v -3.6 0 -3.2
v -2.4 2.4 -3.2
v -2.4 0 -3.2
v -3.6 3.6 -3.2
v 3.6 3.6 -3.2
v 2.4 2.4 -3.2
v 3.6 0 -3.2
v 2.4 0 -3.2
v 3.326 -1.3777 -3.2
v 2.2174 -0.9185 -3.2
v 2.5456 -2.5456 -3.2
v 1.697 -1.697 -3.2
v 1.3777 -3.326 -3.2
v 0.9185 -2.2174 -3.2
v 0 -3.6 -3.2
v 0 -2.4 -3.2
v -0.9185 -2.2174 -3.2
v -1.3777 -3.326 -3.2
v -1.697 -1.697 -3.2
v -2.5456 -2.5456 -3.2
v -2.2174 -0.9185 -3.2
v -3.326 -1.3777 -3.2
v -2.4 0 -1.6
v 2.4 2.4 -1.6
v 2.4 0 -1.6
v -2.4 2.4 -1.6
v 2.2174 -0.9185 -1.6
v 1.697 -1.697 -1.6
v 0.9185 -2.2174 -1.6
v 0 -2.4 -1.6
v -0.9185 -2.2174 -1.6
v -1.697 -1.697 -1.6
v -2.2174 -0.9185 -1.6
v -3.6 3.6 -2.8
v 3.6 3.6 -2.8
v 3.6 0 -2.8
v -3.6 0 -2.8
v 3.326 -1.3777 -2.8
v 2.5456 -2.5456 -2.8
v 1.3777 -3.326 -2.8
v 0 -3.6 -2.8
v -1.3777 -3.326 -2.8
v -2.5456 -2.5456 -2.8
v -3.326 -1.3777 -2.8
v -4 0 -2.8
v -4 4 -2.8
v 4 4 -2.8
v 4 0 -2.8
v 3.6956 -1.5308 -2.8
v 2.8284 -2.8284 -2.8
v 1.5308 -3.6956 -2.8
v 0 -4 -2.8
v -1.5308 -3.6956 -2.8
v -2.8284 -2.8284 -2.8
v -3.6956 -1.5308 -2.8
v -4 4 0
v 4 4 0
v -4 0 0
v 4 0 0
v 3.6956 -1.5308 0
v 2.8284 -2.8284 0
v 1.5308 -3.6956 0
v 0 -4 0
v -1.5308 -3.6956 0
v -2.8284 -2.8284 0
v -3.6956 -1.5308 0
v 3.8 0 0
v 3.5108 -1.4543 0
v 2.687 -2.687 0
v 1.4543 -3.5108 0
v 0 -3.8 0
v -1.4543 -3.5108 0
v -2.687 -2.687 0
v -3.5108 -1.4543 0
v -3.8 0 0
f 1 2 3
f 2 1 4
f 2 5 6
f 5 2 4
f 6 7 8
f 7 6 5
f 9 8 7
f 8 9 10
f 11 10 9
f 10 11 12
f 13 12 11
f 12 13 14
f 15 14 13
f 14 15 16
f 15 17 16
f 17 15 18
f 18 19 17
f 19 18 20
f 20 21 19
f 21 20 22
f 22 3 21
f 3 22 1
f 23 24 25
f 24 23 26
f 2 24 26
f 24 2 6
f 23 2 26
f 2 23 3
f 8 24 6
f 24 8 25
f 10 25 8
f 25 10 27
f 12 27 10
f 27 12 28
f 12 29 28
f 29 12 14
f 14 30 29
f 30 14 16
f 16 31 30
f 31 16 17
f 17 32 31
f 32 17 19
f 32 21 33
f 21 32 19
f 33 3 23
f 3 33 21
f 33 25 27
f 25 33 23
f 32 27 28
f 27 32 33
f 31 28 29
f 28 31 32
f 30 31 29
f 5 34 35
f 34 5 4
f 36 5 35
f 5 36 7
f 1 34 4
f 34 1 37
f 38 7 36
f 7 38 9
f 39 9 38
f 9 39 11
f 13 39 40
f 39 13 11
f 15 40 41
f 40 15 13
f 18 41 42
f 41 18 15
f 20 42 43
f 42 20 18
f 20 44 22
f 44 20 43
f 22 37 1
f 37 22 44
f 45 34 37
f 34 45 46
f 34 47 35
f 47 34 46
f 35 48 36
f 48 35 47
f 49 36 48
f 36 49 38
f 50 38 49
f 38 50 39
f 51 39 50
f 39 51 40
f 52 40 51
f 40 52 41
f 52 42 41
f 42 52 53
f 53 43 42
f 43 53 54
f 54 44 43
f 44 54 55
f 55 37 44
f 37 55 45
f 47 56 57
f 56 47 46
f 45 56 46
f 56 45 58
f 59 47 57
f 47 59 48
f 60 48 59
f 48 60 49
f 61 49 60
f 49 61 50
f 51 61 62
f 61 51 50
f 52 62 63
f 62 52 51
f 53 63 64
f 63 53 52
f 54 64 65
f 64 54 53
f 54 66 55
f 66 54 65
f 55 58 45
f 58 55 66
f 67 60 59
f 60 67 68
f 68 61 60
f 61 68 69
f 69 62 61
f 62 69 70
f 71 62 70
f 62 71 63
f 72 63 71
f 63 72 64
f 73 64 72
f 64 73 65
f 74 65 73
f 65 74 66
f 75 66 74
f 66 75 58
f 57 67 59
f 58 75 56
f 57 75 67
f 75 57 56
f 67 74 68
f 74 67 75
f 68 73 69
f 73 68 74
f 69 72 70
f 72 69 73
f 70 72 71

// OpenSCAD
// file: ../p/2-4edge.scad
use <../lib.scad>
function ldraw_lib__2_4edge() = [
// 0 Circle 0.5
// 0 Name: 2-4edge.dat
// 0 Author: James Jessiman
// 0 !LDRAW_ORG Primitive UPDATE 2017-01
// 0 !LICENSE Licensed under CC BY 4.0 : see CAreadme.txt
// 
// 0 BFC CERTIFY CCW
  [0,"BFC","CERTIFY"],
  [0,"BFC","CCW"],
// 
// 0 !HISTORY 2007-06-24 [PTadmin] Header formatted for Contributor Agreement
// 0 !HISTORY 2008-07-01 [PTadmin] Official Update 2008-01
// 0 !HISTORY 2017-01-15 [Steffen] BFCed
// 0 !HISTORY 2017-12-30 [PTadmin] Official Update 2017-01
// 
// 
// 2 24 1 0 0 0.9239 0 0.3827
  [2,24,1,0,0,0.9239,0,0.3827],
// 2 24 0.9239 0 0.3827 0.7071 0 0.7071
  [2,24,0.9239,0,0.3827,0.7071,0,0.7071],
// 2 24 0.7071 0 0.7071 0.3827 0 0.9239
  [2,24,0.7071,0,0.7071,0.3827,0,0.9239],
// 2 24 0.3827 0 0.9239 0 0 1
  [2,24,0.3827,0,0.9239,0,0,1],
// 2 24 0 0 1 -0.3827 0 0.9239
  [2,24,0,0,1,-0.3827,0,0.9239],
// 2 24 -0.3827 0 0.9239 -0.7071 0 0.7071
  [2,24,-0.3827,0,0.9239,-0.7071,0,0.7071],
// 2 24 -0.7071 0 0.7071 -0.9239 0 0.3827
  [2,24,-0.7071,0,0.7071,-0.9239,0,0.3827],
// 2 24 -0.9239 0 0.3827 -1 0 0
  [2,24,-0.9239,0,0.3827,-1,0,0],
];
module ldraw_lib__2_4edge(step=0, col=false, unit=2/5, alt=false, line=0.2, solid=!$preview)
    makepoly(ldraw_lib__2_4edge(), step=step, col=col, unit=unit, alt=alt, line=line, solid=solid);
ldraw_lib__2_4edge(line=0.2);
// file: ../p/2-4cyli.scad
use <../lib.scad>
function ldraw_lib__2_4cyli() = [
// 0 Cylinder 0.5
// 0 Name: 2-4cyli.dat
// 0 Author: James Jessiman
// 0 !LDRAW_ORG Primitive UPDATE 2005-01
// 0 !LICENSE Licensed under CC BY 4.0 : see CAreadme.txt
// 
// 0 BFC CERTIFY CCW
  [0,"BFC","CERTIFY"],
  [0,"BFC","CCW"],
// 
// 0 !HISTORY 2002-03-23 [sbliss] Added BFC statement; compacted code
// 0 !HISTORY 2002-04-25 [PTadmin] Official Update 2002-02
// 0 !HISTORY 2004-12-11 [nielsk] Recreated using Primitive Generator, Edge lines fixed, BFC changed to CCW
// 0 !HISTORY 2005-12-28 [PTadmin] Official Update 2005-01
// 0 !HISTORY 2007-06-24 [PTadmin] Header formatted for Contributor Agreement
// 0 !HISTORY 2008-07-01 [PTadmin] Official Update 2008-01
// 
// 
// 4 16 .9239 1 .3827 .9239 0 .3827 1 0 0 1 1 0
  [4,16,.9239,1,.3827,.9239,0,.3827,1,0,0,1,1,0],
// 4 16 .7071 1 .7071 .7071 0 .7071 .9239 0 .3827 .9239 1 .3827
  [4,16,.7071,1,.7071,.7071,0,.7071,.9239,0,.3827,.9239,1,.3827],
// 4 16 .3827 1 .9239 .3827 0 .9239 .7071 0 .7071 .7071 1 .7071
  [4,16,.3827,1,.9239,.3827,0,.9239,.7071,0,.7071,.7071,1,.7071],
// 4 16 0 1 1 0 0 1 .3827 0 .9239 .3827 1 .9239
  [4,16,0,1,1,0,0,1,.3827,0,.9239,.3827,1,.9239],
// 4 16 -.3827 1 .9239 -.3827 0 .9239 0 0 1 0 1 1
  [4,16,-.3827,1,.9239,-.3827,0,.9239,0,0,1,0,1,1],
// 4 16 -.7071 1 .7071 -.7071 0 .7071 -.3827 0 .9239 -.3827 1 .9239
  [4,16,-.7071,1,.7071,-.7071,0,.7071,-.3827,0,.9239,-.3827,1,.9239],
// 4 16 -.9239 1 .3827 -.9239 0 .3827 -.7071 0 .7071 -.7071 1 .7071
  [4,16,-.9239,1,.3827,-.9239,0,.3827,-.7071,0,.7071,-.7071,1,.7071],
// 4 16 -1 1 0 -1 0 0 -.9239 0 .3827 -.9239 1 .3827
  [4,16,-1,1,0,-1,0,0,-.9239,0,.3827,-.9239,1,.3827],
// 5 24 1 1 0 1 0 0 1 1 -.4142 .9239 1 .3827
  [5,24,1,1,0,1,0,0,1,1,-.4142,.9239,1,.3827],
// 5 24 .9239 1 .3827 .9239 0 .3827 1 1 0 .7071 1 .7071
  [5,24,.9239,1,.3827,.9239,0,.3827,1,1,0,.7071,1,.7071],
// 5 24 .7071 1 .7071 .7071 0 .7071 .9239 1 .3827 .3827 1 .9239
  [5,24,.7071,1,.7071,.7071,0,.7071,.9239,1,.3827,.3827,1,.9239],
// 5 24 .3827 1 .9239 .3827 0 .9239 .7071 1 .7071 0 1 1
  [5,24,.3827,1,.9239,.3827,0,.9239,.7071,1,.7071,0,1,1],
// 5 24 0 1 1 0 0 1 .3827 1 .9239 -.3827 1 .9239
  [5,24,0,1,1,0,0,1,.3827,1,.9239,-.3827,1,.9239],
// 5 24 -.3827 1 .9239 -.3827 0 .9239 0 1 1 -.7071 1 .7071
  [5,24,-.3827,1,.9239,-.3827,0,.9239,0,1,1,-.7071,1,.7071],
// 5 24 -.7071 1 .7071 -.7071 0 .7071 -.3827 1 .9239 -.9239 1 .3827
  [5,24,-.7071,1,.7071,-.7071,0,.7071,-.3827,1,.9239,-.9239,1,.3827],
// 5 24 -.9239 1 .3827 -.9239 0 .3827 -.7071 1 .7071 -1 1 0
  [5,24,-.9239,1,.3827,-.9239,0,.3827,-.7071,1,.7071,-1,1,0],
// 5 24 -1 1 0 -1 0 0 -.9239 1 .3827 -1 1 -.4142
  [5,24,-1,1,0,-1,0,0,-.9239,1,.3827,-1,1,-.4142],
// 0
];
module ldraw_lib__2_4cyli(step=0, col=false, unit=2/5, alt=false, line=0.2, solid=!$preview)
    makepoly(ldraw_lib__2_4cyli(), step=step, col=col, unit=unit, alt=alt, line=line, solid=solid);
ldraw_lib__2_4cyli(line=0.2);
// file: ../p/box4-4a.scad
use <../lib.scad>
function ldraw_lib__box4_4a() = [
// 0 Box with  4 Faces without  4 Adjacent Edges
// 0 Name: box4-4a.dat
// 0 Author: Willy Tschager [Holly-Wood]
// 0 !LDRAW_ORG Primitive UPDATE 2024-01
// 0 !LICENSE Licensed under CC BY 4.0 : see CAreadme.txt
// 
// 0 BFC CERTIFY CCW
  [0,"BFC","CERTIFY"],
  [0,"BFC","CCW"],
// 
// 0 !HISTORY 1998-07-15 [PTadmin] Official Update 1998-07
// 0 !HISTORY 2002-12-13 [hafhead] Made BFC compliant
// 0 !HISTORY 2003-03-12 [PTadmin] Official Update 2003-01
// 0 !HISTORY 2007-06-24 [PTadmin] Header formatted for Contributor Agreement
// 0 !HISTORY 2008-07-01 [PTadmin] Official Update 2008-01
// 0 !HISTORY 2012-02-16 [Philo] Changed to CCW
// 0 !HISTORY 2012-03-30 [PTadmin] Official Update 2012-01
// 0 !HISTORY 2024-01-03 [Holly-Wood] Complete re-write, original by Manfred Moolhuysen
// 0 !HISTORY 2024-01-29 [OrionP] Official Update 2024-01
// 
// 2 24 -1 1 -1 -1 1 1
  [2,24,-1,1,-1,-1,1,1],
// 2 24 1 1 1 1 1 -1
  [2,24,1,1,1,1,1,-1],
// 2 24 -1 1 1 1 1 1
  [2,24,-1,1,1,1,1,1],
// 4 16 1 1 1 1 1 -1 -1 1 -1 -1 1 1
  [4,16,1,1,1,1,1,-1,-1,1,-1,-1,1,1],
// 
// 2 24 -1 0 -1 -1 0 1
  [2,24,-1,0,-1,-1,0,1],
// 4 16 -1 1 1 -1 1 -1 -1 0 -1 -1 0 1
  [4,16,-1,1,1,-1,1,-1,-1,0,-1,-1,0,1],
// 
// 2 24 1 0 1 1 0 -1
  [2,24,1,0,1,1,0,-1],
// 4 16 1 1 -1 1 1 1 1 0 1 1 0 -1
  [4,16,1,1,-1,1,1,1,1,0,1,1,0,-1],
// 
// 2 24 1 1 1 1 0 1
  [2,24,1,1,1,1,0,1],
// 2 24 -1 1 1 -1 0 1
  [2,24,-1,1,1,-1,0,1],
// 2 24 -1 0 1 1 0 1
  [2,24,-1,0,1,1,0,1],
// 4 16 1 1 1 -1 1 1 -1 0 1 1 0 1
  [4,16,1,1,1,-1,1,1,-1,0,1,1,0,1],
];
module ldraw_lib__box4_4a(step=0, col=false, unit=2/5, alt=false, line=0.2, solid=!$preview)
    makepoly(ldraw_lib__box4_4a(), step=step, col=col, unit=unit, alt=alt, line=line, solid=solid);
ldraw_lib__box4_4a(line=0.2);
// file: ../p/box3u4a.scad
use <../lib.scad>
function ldraw_lib__box3u4a() = [
// 0 Box with 3 Faces without 4 Adjacent Edges
// 0 Name: box3u4a.dat
// 0 Author: Niels Karsdorp [nielsk]
// 0 !LDRAW_ORG Primitive UPDATE 2009-01
// 0 !LICENSE Licensed under CC BY 4.0 : see CAreadme.txt
// 
// 0 BFC CERTIFY CCW
  [0,"BFC","CERTIFY"],
  [0,"BFC","CCW"],
// 
// 0 !HISTORY 2009-05-02 [PTadmin] Official Update 2009-01
// 
// 
// 2 24 1 1 1 -1 1 1
  [2,24,1,1,1,-1,1,1],
// 2 24 -1 1 -1 1 1 -1
  [2,24,-1,1,-1,1,1,-1],
// 2 24 1 1 1 1 1 -1
  [2,24,1,1,1,1,1,-1],
// 2 24 -1 1 1 -1 1 -1
  [2,24,-1,1,1,-1,1,-1],
// 2 24 1 1 1 1 0 1
  [2,24,1,1,1,1,0,1],
// 2 24 1 1 -1 1 0 -1
  [2,24,1,1,-1,1,0,-1],
// 2 24 -1 1 1 -1 0 1
  [2,24,-1,1,1,-1,0,1],
// 2 24 -1 1 -1 -1 0 -1
  [2,24,-1,1,-1,-1,0,-1],
// 4 16 -1 1 -1 -1 1 1 1 1 1 1 1 -1
  [4,16,-1,1,-1,-1,1,1,1,1,1,1,1,-1],
// 4 16 -1 1 1 -1 0 1 1 0 1 1 1 1
  [4,16,-1,1,1,-1,0,1,1,0,1,1,1,1],
// 4 16 1 1 -1 1 0 -1 -1 0 -1 -1 1 -1
  [4,16,1,1,-1,1,0,-1,-1,0,-1,-1,1,-1],
// 0
];
module ldraw_lib__box3u4a(step=0, col=false, unit=2/5, alt=false, line=0.2, solid=!$preview)
    makepoly(ldraw_lib__box3u4a(), step=step, col=col, unit=unit, alt=alt, line=line, solid=solid);
ldraw_lib__box3u4a(line=0.2);
// file: ../p/2-4ring9.scad
use <../lib.scad>
function ldraw_lib__2_4ring9() = [
// 0 Ring  9 x 0.5
// 0 Name: 2-4ring9.dat
// 0 Author: Willy Tschager [Holly-Wood]
// 0 !LDRAW_ORG Primitive UPDATE 2024-01
// 0 !LICENSE Licensed under CC BY 4.0 : see CAreadme.txt
// 
// 0 BFC CERTIFY CCW
  [0,"BFC","CERTIFY"],
  [0,"BFC","CCW"],
// 
// 0 !HISTORY 2009-09-03 [PTadmin] Official Update 2009-02
// 0 !HISTORY 2024-01-10 [Holly-Wood] Complete regeneration, original by guyvivan
// 0 !HISTORY 2024-01-29 [OrionP] Official Update 2024-01
// 
// 4 16 10 0 0 9.239 0 3.827 8.3151 0 3.4443 9 0 0
  [4,16,10,0,0,9.239,0,3.827,8.3151,0,3.4443,9,0,0],
// 4 16 9.239 0 3.827 7.071 0 7.071 6.3639 0 6.3639 8.3151 0 3.4443
  [4,16,9.239,0,3.827,7.071,0,7.071,6.3639,0,6.3639,8.3151,0,3.4443],
// 4 16 7.071 0 7.071 3.827 0 9.239 3.4443 0 8.3151 6.3639 0 6.3639
  [4,16,7.071,0,7.071,3.827,0,9.239,3.4443,0,8.3151,6.3639,0,6.3639],
// 4 16 3.827 0 9.239 0 0 10 0 0 9 3.4443 0 8.3151
  [4,16,3.827,0,9.239,0,0,10,0,0,9,3.4443,0,8.3151],
// 4 16 0 0 10 -3.827 0 9.239 -3.4443 0 8.3151 0 0 9
  [4,16,0,0,10,-3.827,0,9.239,-3.4443,0,8.3151,0,0,9],
// 4 16 -3.827 0 9.239 -7.071 0 7.071 -6.3639 0 6.3639 -3.4443 0 8.3151
  [4,16,-3.827,0,9.239,-7.071,0,7.071,-6.3639,0,6.3639,-3.4443,0,8.3151],
// 4 16 -7.071 0 7.071 -9.239 0 3.827 -8.3151 0 3.4443 -6.3639 0 6.3639
  [4,16,-7.071,0,7.071,-9.239,0,3.827,-8.3151,0,3.4443,-6.3639,0,6.3639],
// 4 16 -9.239 0 3.827 -10 0 0 -9 0 0 -8.3151 0 3.4443
  [4,16,-9.239,0,3.827,-10,0,0,-9,0,0,-8.3151,0,3.4443],
// 0 // Build by LDPartEditor (PrimGen 2.X)
];
module ldraw_lib__2_4ring9(step=0, col=false, unit=2/5, alt=false, line=0.2, solid=!$preview)
    makepoly(ldraw_lib__2_4ring9(), step=step, col=col, unit=unit, alt=alt, line=line, solid=solid);
ldraw_lib__2_4ring9(line=0.2);
// file: ../p/2-4ring2.scad
use <../lib.scad>
function ldraw_lib__2_4ring2() = [
// 0 Ring  2 x 0.5
// 0 Name: 2-4ring2.dat
// 0 Author: Chris Dee [cwdee]
// 0 !LDRAW_ORG Primitive UPDATE 2012-01
// 0 !LICENSE Licensed under CC BY 4.0 : see CAreadme.txt
// 
// 0 BFC CERTIFY CCW
  [0,"BFC","CERTIFY"],
  [0,"BFC","CCW"],
// 
// 0 !HISTORY 2001-10-26 [PTadmin] Official Update 2001-01
// 0 !HISTORY 2007-06-24 [PTadmin] Header formatted for Contributor Agreement
// 0 !HISTORY 2008-07-01 [PTadmin] Official Update 2008-01
// 0 !HISTORY 2012-02-16 [Philo] Changed to CCW
// 0 !HISTORY 2012-03-30 [PTadmin] Official Update 2012-01
// 
// 
// 4 16 3 0 0 2.7717 0 1.1481 1.8478 0 0.7654 2 0 0
  [4,16,3,0,0,2.7717,0,1.1481,1.8478,0,0.7654,2,0,0],
// 4 16 2.7717 0 1.1481 2.1213 0 2.1213 1.4142 0 1.4142 1.8478 0 0.7654
  [4,16,2.7717,0,1.1481,2.1213,0,2.1213,1.4142,0,1.4142,1.8478,0,0.7654],
// 4 16 2.1213 0 2.1213 1.1481 0 2.7717 0.7654 0 1.8478 1.4142 0 1.4142
  [4,16,2.1213,0,2.1213,1.1481,0,2.7717,0.7654,0,1.8478,1.4142,0,1.4142],
// 4 16 1.1481 0 2.7717 0 0 3 0 0 2 0.7654 0 1.8478
  [4,16,1.1481,0,2.7717,0,0,3,0,0,2,0.7654,0,1.8478],
// 4 16 0 0 3 -1.1481 0 2.7717 -0.7654 0 1.8478 0 0 2
  [4,16,0,0,3,-1.1481,0,2.7717,-0.7654,0,1.8478,0,0,2],
// 4 16 -1.1481 0 2.7717 -2.1213 0 2.1213 -1.4142 0 1.4142 -0.7654 0 1.8478
  [4,16,-1.1481,0,2.7717,-2.1213,0,2.1213,-1.4142,0,1.4142,-0.7654,0,1.8478],
// 4 16 -2.1213 0 2.1213 -2.7717 0 1.1481 -1.8478 0 0.7654 -1.4142 0 1.4142
  [4,16,-2.1213,0,2.1213,-2.7717,0,1.1481,-1.8478,0,0.7654,-1.4142,0,1.4142],
// 4 16 -2.7717 0 1.1481 -3 0 0 -2 0 0 -1.8478 0 0.7654
  [4,16,-2.7717,0,1.1481,-3,0,0,-2,0,0,-1.8478,0,0.7654],
];
module ldraw_lib__2_4ring2(step=0, col=false, unit=2/5, alt=false, line=0.2, solid=!$preview)
    makepoly(ldraw_lib__2_4ring2(), step=step, col=col, unit=unit, alt=alt, line=line, solid=solid);
ldraw_lib__2_4ring2(line=0.2);
// file: ../p/2-4cylo.scad
use <../lib.scad>
use <2-4cyli.scad>
use <2-4edge.scad>
function ldraw_lib__2_4cylo() = [
// 0 Cylinder Open 0.5
// 0 Name: 2-4cylo.dat
// 0 Author: Max Martin Richter [MMR1988]
// 0 !LDRAW_ORG Primitive UPDATE 2010-03
// 0 !LICENSE Licensed under CC BY 4.0 : see CAreadme.txt
// 
// 0 BFC CERTIFY CCW
  [0,"BFC","CERTIFY"],
  [0,"BFC","CCW"],
// 
// 0 !HISTORY 2010-12-31 [PTadmin] Official Update 2010-03
// 
// 
// 1 16 0 0 0 1 0 0 0 1 0 0 0 1 2-4edge.dat
  [1,16,0,0,0,1,0,0,0,1,0,0,0,1, ldraw_lib__2_4edge()],
// 1 16 0 1 0 1 0 0 0 1 0 0 0 1 2-4edge.dat
  [1,16,0,1,0,1,0,0,0,1,0,0,0,1, ldraw_lib__2_4edge()],
// 1 16 0 0 0 1 0 0 0 1 0 0 0 1 2-4cyli.dat
  [1,16,0,0,0,1,0,0,0,1,0,0,0,1, ldraw_lib__2_4cyli()],
];
module ldraw_lib__2_4cylo(step=0, col=false, unit=2/5, alt=false, line=0.2, solid=!$preview)
    makepoly(ldraw_lib__2_4cylo(), step=step, col=col, unit=unit, alt=alt, line=line, solid=solid);
ldraw_lib__2_4cylo(line=0.2);
// file: s/24246s02.scad
use <../../lib.scad>
use <../../p/2-4chrd.scad>
use <../../p/2-4cylo.scad>
use <../../p/2-4ring2.scad>
use <../../p/2-4ring9.scad>
use <../../p/box3u4a.scad>
use <../../p/box4-4a.scad>
function ldraw_lib__s__24246s02() = [
// 0 ~Tile  1 x  1 with Rounded End without Complete Top Face
// 0 Name: s\24246s02.dat
// 0 Author: Magnus Forsberg [MagFors]
// 0 !LDRAW_ORG Subpart UPDATE 2020-02
// 0 !LICENSE Licensed under CC BY 4.0 : see CAreadme.txt
// 
// 0 BFC CERTIFY CCW
  [0,"BFC","CERTIFY"],
  [0,"BFC","CCW"],
// 
// 0 !HISTORY 2020-09-05 [PTadmin] Official Update 2020-02
// 
// 
// 4 16 -9 8 0 -9 8 9 -6 8 6 -6 8 0
  [4,16,-9,8,0,-9,8,9,-6,8,6,-6,8,0],
// 4 16 -9 8 9 9 8 9 6 8 6 -6 8 6
  [4,16,-9,8,9,9,8,9,6,8,6,-6,8,6],
// 4 16 9 8 9 9 8 0 6 8 0 6 8 6
  [4,16,9,8,9,9,8,0,6,8,0,6,8,6],
// 1 16 0 8 0 3 0 0 0 -1 0 0 0 -3 2-4ring2.dat
  [1,16,0,8,0,3,0,0,0,-1,0,0,0,-3, ldraw_lib__2_4ring2()],
// 0 BFC INVERTNEXT
  [0,"BFC","INVERTNEXT"],
// 1 16 0 8 3 6 0 0 0 -4 0 0 0 3 box4-4a.dat
  [1,16,0,8,3,6,0,0,0,-4,0,0,0,3, ldraw_lib__box4_4a()],
// 0 BFC INVERTNEXT
  [0,"BFC","INVERTNEXT"],
// 1 16 0 4 0 6 0 0 0 4 0 0 0 -6 2-4cylo.dat
  [1,16,0,4,0,6,0,0,0,4,0,0,0,-6, ldraw_lib__2_4cylo()],
// 1 16 0 4 0 6 0 0 0 -4 0 0 0 -6 2-4chrd.dat
  [1,16,0,4,0,6,0,0,0,-4,0,0,0,-6, ldraw_lib__2_4chrd()],
// 1 16 0 7.5 0 0 0 9 0.5 0 0 0 9 0 box3u4a.dat
  [1,16,0,7.5,0,0,0,9,0.5,0,0,0,9,0, ldraw_lib__box3u4a()],
// 1 16 0 7 0 9 0 0 0 1 0 0 0 -9 2-4cylo.dat
  [1,16,0,7,0,9,0,0,0,1,0,0,0,-9, ldraw_lib__2_4cylo()],
// 4 16 -10 7 0 -10 7 10 -9 7 9 -9 7 0
  [4,16,-10,7,0,-10,7,10,-9,7,9,-9,7,0],
// 4 16 -10 7 10 10 7 10 9 7 9 -9 7 9
  [4,16,-10,7,10,10,7,10,9,7,9,-9,7,9],
// 4 16 10 7 10 10 7 0 9 7 0 9 7 9
  [4,16,10,7,10,10,7,0,9,7,0,9,7,9],
// 1 16 0 7 0 1 0 0 0 -1 0 0 0 -1 2-4ring9.dat
  [1,16,0,7,0,1,0,0,0,-1,0,0,0,-1, ldraw_lib__2_4ring9()],
// 1 16 0 3.5 0 0 0 -10 -3.5 0 0 0 10 0 box3u4a.dat
  [1,16,0,3.5,0,0,0,-10,-3.5,0,0,0,10,0, ldraw_lib__box3u4a()],
// 1 16 0 0 0 10 0 0 0 7 0 0 0 -10 2-4cylo.dat
  [1,16,0,0,0,10,0,0,0,7,0,0,0,-10, ldraw_lib__2_4cylo()],
];
module ldraw_lib__s__24246s02(step=0, col=false, unit=2/5, alt=false, line=0.2, solid=!$preview)
    makepoly(ldraw_lib__s__24246s02(), step=step, col=col, unit=unit, alt=alt, line=line, solid=solid);
ldraw_lib__s__24246s02(line=0.2);
// file: ../p/2-4ring19.scad
use <../lib.scad>
function ldraw_lib__2_4ring19() = [
// 0 Ring 19 x 0.5
// 0 Name: 2-4ring19.dat
// 0 Author: Willy Tschager [Holly-Wood]
// 0 !LDRAW_ORG Primitive UPDATE 2024-02
// 0 !LICENSE Licensed under CC BY 4.0 : see CAreadme.txt
// 
// 0 BFC CERTIFY CCW
  [0,"BFC","CERTIFY"],
  [0,"BFC","CCW"],
// 
// 0 !HISTORY 2016-12-31 [PTadmin] Official Update 2016-01
// 0 !HISTORY 2024-02-06 [Holly-Wood] Complete regeneration, original by KROACH
// 0 !HISTORY 2024-03-24 [OrionP] Official Update 2024-02
// 
// 4 16 20 0 0 18.478 0 7.654 17.5541 0 7.2713 19 0 0
  [4,16,20,0,0,18.478,0,7.654,17.5541,0,7.2713,19,0,0],
// 4 16 18.478 0 7.654 14.142 0 14.142 13.4349 0 13.4349 17.5541 0 7.2713
  [4,16,18.478,0,7.654,14.142,0,14.142,13.4349,0,13.4349,17.5541,0,7.2713],
// 4 16 14.142 0 14.142 7.654 0 18.478 7.2713 0 17.5541 13.4349 0 13.4349
  [4,16,14.142,0,14.142,7.654,0,18.478,7.2713,0,17.5541,13.4349,0,13.4349],
// 4 16 7.654 0 18.478 0 0 20 0 0 19 7.2713 0 17.5541
  [4,16,7.654,0,18.478,0,0,20,0,0,19,7.2713,0,17.5541],
// 4 16 0 0 20 -7.654 0 18.478 -7.2713 0 17.5541 0 0 19
  [4,16,0,0,20,-7.654,0,18.478,-7.2713,0,17.5541,0,0,19],
// 4 16 -7.654 0 18.478 -14.142 0 14.142 -13.4349 0 13.4349 -7.2713 0 17.5541
  [4,16,-7.654,0,18.478,-14.142,0,14.142,-13.4349,0,13.4349,-7.2713,0,17.5541],
// 4 16 -14.142 0 14.142 -18.478 0 7.654 -17.5541 0 7.2713 -13.4349 0 13.4349
  [4,16,-14.142,0,14.142,-18.478,0,7.654,-17.5541,0,7.2713,-13.4349,0,13.4349],
// 4 16 -18.478 0 7.654 -20 0 0 -19 0 0 -17.5541 0 7.2713
  [4,16,-18.478,0,7.654,-20,0,0,-19,0,0,-17.5541,0,7.2713],
// 0 // Build by LDPartEditor (PrimGen 2.X)
];
module ldraw_lib__2_4ring19(step=0, col=false, unit=2/5, alt=false, line=0.2, solid=!$preview)
    makepoly(ldraw_lib__2_4ring19(), step=step, col=col, unit=unit, alt=alt, line=line, solid=solid);
ldraw_lib__2_4ring19(line=0.2);
// file: s/24246s01.scad
use <../../lib.scad>
use <../../p/2-4ring19.scad>
use <24246s02.scad>
function ldraw_lib__s__24246s01() = [
// 0 ~Tile  1 x  1 with Rounded End with Partial Top Face
// 0 Name: s\24246s01.dat
// 0 Author: Owen Burgoyne [C3POwen]
// 0 !LDRAW_ORG Subpart UPDATE 2020-02
// 0 !LICENSE Licensed under CC BY 4.0 : see CAreadme.txt
// 
// 0 BFC CERTIFY CCW
  [0,"BFC","CERTIFY"],
  [0,"BFC","CCW"],
// 
// 0 !HISTORY 2016-10-15 [MagFors] smaller topradius
// 0 !HISTORY 2016-12-31 [PTadmin] Official Update 2016-01
// 0 !HISTORY 2019-06-17 [MagFors] Removed topradius
// 0 !HISTORY 2019-07-19 [MagFors] Subfiled without top surface
// 0 !HISTORY 2020-09-05 [PTadmin] Official Update 2020-02
// 
// 
// 1 16 0 0 0 1 0 0 0 1 0 0 0 1 s\24246s02.dat
  [1,16,0,0,0,1,0,0,0,1,0,0,0,1, ldraw_lib__s__24246s02()],
// 1 16 0 0 0 .5 0 0 0 1 0 0 0 -.5 2-4ring19.dat
  [1,16,0,0,0,.5,0,0,0,1,0,0,0,-.5, ldraw_lib__2_4ring19()],
// 3 16 10 0 10 9.5 0 0 10 0 0
  [3,16,10,0,10,9.5,0,0,10,0,0],
// 3 16 -10 0 0 -9.5 0 0 -10 0 10
  [3,16,-10,0,0,-9.5,0,0,-10,0,10],
];
module ldraw_lib__s__24246s01(step=0, col=false, unit=2/5, alt=false, line=0.2, solid=!$preview)
    makepoly(ldraw_lib__s__24246s01(), step=step, col=col, unit=unit, alt=alt, line=line, solid=solid);
ldraw_lib__s__24246s01(line=0.2);
// file: ../p/2-4chrd.scad
use <../lib.scad>
function ldraw_lib__2_4chrd() = [
// 0 Chord 0.5
// 0 Name: 2-4chrd.dat
// 0 Author: Philippe Hurbain [Philo]
// 0 !LDRAW_ORG Primitive UPDATE 2014-01
// 0 !LICENSE Licensed under CC BY 4.0 : see CAreadme.txt
// 
// 0 BFC CERTIFY CCW
  [0,"BFC","CERTIFY"],
  [0,"BFC","CCW"],
// 
// 0 !HISTORY 2014-06-21 [PTadmin] Official Update 2014-01
// 
// 
// 4 16 0.9239 0 0.3827 -0.9239 0 0.3827 -1 0 0 1 0 0
  [4,16,0.9239,0,0.3827,-0.9239,0,0.3827,-1,0,0,1,0,0],
// 4 16 0.7071 0 0.7071 -0.7071 0 0.7071 -0.9239 0 0.3827 0.9239 0 0.3827
  [4,16,0.7071,0,0.7071,-0.7071,0,0.7071,-0.9239,0,0.3827,0.9239,0,0.3827],
// 4 16 0.3827 0 0.9239 -0.3827 0 0.9239 -0.7071 0 0.7071 0.7071 0 0.7071
  [4,16,0.3827,0,0.9239,-0.3827,0,0.9239,-0.7071,0,0.7071,0.7071,0,0.7071],
// 3 16 0 0 1 -0.3827 0 0.9239 0.3827 0 0.9239
  [3,16,0,0,1,-0.3827,0,0.9239,0.3827,0,0.9239],
];
module ldraw_lib__2_4chrd(step=0, col=false, unit=2/5, alt=false, line=0.2, solid=!$preview)
    makepoly(ldraw_lib__2_4chrd(), step=step, col=col, unit=unit, alt=alt, line=line, solid=solid);
ldraw_lib__2_4chrd(line=0.2);
// file: 24246.scad
use <../lib.scad>
use <../p/2-4chrd.scad>
use <s/24246s01.scad>
function ldraw_lib__24246() = [
// 0 Tile  1 x  1 with Rounded End
// 0 Name: 24246.dat
// 0 Author: Owen Burgoyne [C3POwen]
// 0 !LDRAW_ORG Part UPDATE 2016-01
// 0 !LICENSE Licensed under CC BY 4.0 : see CAreadme.txt
// 
// 0 BFC CERTIFY CCW
  [0,"BFC","CERTIFY"],
  [0,"BFC","CCW"],
// 
// 0 !HISTORY 2016-12-31 [PTadmin] Official Update 2016-01
// 
// 
// 1 16 0 0 0 1 0 0 0 1 0 0 0 1 s\24246s01.dat
  [1,16,0,0,0,1,0,0,0,1,0,0,0,1, ldraw_lib__s__24246s01()],
// 4 16 -10 0 10 -9.5 0 0 9.5 0 0 10 0 10
  [4,16,-10,0,10,-9.5,0,0,9.5,0,0,10,0,10],
// 1 16 0 0 0 9.5 0 0 0 1 0 0 0 -9.5 2-4chrd.dat
  [1,16,0,0,0,9.5,0,0,0,1,0,0,0,-9.5, ldraw_lib__2_4chrd()],
];
module ldraw_lib__24246(step=0, col=false, unit=2/5, alt=false, line=0.2, solid=!$preview)
    makepoly(ldraw_lib__24246(), step=step, col=col, unit=unit, alt=alt, line=line, solid=solid);
ldraw_lib__24246(line=0.2);
// main file
use <../lib.scad>
use <24246.scad>
function ldraw_lib__35398() = [
// 0 =Tile  1 x  1 with Rounded End
// 0 Name: 35398.dat
// 0 Author: Massimo Maso [Sirio]
// 0 !LDRAW_ORG Part Alias UPDATE 2025-05
// 0 !LICENSE Licensed under CC BY 4.0 : see CAreadme.txt
// 
// 0 BFC CERTIFY CCW
  [0,"BFC","CERTIFY"],
  [0,"BFC","CCW"],
// 
// 0 !KEYWORDS BrickLink 24246, Rebrickable 24246
// 
// 0 !HISTORY 2025-05-28 [OrionP] Official Update 2025-05
// 
// 1 16 0 0 0 1 0 0 0 1 0 0 0 1 24246.dat
  [1,16,0,0,0,1,0,0,0,1,0,0,0,1, ldraw_lib__24246()],
];
module ldraw_lib__35398(step=0, col=false, unit=2/5, alt=false, line=0.2, solid=!$preview)
    makepoly(ldraw_lib__35398(), step=step, col=col, unit=unit, alt=alt, line=line, solid=solid);
ldraw_lib__35398(line=0.2);
